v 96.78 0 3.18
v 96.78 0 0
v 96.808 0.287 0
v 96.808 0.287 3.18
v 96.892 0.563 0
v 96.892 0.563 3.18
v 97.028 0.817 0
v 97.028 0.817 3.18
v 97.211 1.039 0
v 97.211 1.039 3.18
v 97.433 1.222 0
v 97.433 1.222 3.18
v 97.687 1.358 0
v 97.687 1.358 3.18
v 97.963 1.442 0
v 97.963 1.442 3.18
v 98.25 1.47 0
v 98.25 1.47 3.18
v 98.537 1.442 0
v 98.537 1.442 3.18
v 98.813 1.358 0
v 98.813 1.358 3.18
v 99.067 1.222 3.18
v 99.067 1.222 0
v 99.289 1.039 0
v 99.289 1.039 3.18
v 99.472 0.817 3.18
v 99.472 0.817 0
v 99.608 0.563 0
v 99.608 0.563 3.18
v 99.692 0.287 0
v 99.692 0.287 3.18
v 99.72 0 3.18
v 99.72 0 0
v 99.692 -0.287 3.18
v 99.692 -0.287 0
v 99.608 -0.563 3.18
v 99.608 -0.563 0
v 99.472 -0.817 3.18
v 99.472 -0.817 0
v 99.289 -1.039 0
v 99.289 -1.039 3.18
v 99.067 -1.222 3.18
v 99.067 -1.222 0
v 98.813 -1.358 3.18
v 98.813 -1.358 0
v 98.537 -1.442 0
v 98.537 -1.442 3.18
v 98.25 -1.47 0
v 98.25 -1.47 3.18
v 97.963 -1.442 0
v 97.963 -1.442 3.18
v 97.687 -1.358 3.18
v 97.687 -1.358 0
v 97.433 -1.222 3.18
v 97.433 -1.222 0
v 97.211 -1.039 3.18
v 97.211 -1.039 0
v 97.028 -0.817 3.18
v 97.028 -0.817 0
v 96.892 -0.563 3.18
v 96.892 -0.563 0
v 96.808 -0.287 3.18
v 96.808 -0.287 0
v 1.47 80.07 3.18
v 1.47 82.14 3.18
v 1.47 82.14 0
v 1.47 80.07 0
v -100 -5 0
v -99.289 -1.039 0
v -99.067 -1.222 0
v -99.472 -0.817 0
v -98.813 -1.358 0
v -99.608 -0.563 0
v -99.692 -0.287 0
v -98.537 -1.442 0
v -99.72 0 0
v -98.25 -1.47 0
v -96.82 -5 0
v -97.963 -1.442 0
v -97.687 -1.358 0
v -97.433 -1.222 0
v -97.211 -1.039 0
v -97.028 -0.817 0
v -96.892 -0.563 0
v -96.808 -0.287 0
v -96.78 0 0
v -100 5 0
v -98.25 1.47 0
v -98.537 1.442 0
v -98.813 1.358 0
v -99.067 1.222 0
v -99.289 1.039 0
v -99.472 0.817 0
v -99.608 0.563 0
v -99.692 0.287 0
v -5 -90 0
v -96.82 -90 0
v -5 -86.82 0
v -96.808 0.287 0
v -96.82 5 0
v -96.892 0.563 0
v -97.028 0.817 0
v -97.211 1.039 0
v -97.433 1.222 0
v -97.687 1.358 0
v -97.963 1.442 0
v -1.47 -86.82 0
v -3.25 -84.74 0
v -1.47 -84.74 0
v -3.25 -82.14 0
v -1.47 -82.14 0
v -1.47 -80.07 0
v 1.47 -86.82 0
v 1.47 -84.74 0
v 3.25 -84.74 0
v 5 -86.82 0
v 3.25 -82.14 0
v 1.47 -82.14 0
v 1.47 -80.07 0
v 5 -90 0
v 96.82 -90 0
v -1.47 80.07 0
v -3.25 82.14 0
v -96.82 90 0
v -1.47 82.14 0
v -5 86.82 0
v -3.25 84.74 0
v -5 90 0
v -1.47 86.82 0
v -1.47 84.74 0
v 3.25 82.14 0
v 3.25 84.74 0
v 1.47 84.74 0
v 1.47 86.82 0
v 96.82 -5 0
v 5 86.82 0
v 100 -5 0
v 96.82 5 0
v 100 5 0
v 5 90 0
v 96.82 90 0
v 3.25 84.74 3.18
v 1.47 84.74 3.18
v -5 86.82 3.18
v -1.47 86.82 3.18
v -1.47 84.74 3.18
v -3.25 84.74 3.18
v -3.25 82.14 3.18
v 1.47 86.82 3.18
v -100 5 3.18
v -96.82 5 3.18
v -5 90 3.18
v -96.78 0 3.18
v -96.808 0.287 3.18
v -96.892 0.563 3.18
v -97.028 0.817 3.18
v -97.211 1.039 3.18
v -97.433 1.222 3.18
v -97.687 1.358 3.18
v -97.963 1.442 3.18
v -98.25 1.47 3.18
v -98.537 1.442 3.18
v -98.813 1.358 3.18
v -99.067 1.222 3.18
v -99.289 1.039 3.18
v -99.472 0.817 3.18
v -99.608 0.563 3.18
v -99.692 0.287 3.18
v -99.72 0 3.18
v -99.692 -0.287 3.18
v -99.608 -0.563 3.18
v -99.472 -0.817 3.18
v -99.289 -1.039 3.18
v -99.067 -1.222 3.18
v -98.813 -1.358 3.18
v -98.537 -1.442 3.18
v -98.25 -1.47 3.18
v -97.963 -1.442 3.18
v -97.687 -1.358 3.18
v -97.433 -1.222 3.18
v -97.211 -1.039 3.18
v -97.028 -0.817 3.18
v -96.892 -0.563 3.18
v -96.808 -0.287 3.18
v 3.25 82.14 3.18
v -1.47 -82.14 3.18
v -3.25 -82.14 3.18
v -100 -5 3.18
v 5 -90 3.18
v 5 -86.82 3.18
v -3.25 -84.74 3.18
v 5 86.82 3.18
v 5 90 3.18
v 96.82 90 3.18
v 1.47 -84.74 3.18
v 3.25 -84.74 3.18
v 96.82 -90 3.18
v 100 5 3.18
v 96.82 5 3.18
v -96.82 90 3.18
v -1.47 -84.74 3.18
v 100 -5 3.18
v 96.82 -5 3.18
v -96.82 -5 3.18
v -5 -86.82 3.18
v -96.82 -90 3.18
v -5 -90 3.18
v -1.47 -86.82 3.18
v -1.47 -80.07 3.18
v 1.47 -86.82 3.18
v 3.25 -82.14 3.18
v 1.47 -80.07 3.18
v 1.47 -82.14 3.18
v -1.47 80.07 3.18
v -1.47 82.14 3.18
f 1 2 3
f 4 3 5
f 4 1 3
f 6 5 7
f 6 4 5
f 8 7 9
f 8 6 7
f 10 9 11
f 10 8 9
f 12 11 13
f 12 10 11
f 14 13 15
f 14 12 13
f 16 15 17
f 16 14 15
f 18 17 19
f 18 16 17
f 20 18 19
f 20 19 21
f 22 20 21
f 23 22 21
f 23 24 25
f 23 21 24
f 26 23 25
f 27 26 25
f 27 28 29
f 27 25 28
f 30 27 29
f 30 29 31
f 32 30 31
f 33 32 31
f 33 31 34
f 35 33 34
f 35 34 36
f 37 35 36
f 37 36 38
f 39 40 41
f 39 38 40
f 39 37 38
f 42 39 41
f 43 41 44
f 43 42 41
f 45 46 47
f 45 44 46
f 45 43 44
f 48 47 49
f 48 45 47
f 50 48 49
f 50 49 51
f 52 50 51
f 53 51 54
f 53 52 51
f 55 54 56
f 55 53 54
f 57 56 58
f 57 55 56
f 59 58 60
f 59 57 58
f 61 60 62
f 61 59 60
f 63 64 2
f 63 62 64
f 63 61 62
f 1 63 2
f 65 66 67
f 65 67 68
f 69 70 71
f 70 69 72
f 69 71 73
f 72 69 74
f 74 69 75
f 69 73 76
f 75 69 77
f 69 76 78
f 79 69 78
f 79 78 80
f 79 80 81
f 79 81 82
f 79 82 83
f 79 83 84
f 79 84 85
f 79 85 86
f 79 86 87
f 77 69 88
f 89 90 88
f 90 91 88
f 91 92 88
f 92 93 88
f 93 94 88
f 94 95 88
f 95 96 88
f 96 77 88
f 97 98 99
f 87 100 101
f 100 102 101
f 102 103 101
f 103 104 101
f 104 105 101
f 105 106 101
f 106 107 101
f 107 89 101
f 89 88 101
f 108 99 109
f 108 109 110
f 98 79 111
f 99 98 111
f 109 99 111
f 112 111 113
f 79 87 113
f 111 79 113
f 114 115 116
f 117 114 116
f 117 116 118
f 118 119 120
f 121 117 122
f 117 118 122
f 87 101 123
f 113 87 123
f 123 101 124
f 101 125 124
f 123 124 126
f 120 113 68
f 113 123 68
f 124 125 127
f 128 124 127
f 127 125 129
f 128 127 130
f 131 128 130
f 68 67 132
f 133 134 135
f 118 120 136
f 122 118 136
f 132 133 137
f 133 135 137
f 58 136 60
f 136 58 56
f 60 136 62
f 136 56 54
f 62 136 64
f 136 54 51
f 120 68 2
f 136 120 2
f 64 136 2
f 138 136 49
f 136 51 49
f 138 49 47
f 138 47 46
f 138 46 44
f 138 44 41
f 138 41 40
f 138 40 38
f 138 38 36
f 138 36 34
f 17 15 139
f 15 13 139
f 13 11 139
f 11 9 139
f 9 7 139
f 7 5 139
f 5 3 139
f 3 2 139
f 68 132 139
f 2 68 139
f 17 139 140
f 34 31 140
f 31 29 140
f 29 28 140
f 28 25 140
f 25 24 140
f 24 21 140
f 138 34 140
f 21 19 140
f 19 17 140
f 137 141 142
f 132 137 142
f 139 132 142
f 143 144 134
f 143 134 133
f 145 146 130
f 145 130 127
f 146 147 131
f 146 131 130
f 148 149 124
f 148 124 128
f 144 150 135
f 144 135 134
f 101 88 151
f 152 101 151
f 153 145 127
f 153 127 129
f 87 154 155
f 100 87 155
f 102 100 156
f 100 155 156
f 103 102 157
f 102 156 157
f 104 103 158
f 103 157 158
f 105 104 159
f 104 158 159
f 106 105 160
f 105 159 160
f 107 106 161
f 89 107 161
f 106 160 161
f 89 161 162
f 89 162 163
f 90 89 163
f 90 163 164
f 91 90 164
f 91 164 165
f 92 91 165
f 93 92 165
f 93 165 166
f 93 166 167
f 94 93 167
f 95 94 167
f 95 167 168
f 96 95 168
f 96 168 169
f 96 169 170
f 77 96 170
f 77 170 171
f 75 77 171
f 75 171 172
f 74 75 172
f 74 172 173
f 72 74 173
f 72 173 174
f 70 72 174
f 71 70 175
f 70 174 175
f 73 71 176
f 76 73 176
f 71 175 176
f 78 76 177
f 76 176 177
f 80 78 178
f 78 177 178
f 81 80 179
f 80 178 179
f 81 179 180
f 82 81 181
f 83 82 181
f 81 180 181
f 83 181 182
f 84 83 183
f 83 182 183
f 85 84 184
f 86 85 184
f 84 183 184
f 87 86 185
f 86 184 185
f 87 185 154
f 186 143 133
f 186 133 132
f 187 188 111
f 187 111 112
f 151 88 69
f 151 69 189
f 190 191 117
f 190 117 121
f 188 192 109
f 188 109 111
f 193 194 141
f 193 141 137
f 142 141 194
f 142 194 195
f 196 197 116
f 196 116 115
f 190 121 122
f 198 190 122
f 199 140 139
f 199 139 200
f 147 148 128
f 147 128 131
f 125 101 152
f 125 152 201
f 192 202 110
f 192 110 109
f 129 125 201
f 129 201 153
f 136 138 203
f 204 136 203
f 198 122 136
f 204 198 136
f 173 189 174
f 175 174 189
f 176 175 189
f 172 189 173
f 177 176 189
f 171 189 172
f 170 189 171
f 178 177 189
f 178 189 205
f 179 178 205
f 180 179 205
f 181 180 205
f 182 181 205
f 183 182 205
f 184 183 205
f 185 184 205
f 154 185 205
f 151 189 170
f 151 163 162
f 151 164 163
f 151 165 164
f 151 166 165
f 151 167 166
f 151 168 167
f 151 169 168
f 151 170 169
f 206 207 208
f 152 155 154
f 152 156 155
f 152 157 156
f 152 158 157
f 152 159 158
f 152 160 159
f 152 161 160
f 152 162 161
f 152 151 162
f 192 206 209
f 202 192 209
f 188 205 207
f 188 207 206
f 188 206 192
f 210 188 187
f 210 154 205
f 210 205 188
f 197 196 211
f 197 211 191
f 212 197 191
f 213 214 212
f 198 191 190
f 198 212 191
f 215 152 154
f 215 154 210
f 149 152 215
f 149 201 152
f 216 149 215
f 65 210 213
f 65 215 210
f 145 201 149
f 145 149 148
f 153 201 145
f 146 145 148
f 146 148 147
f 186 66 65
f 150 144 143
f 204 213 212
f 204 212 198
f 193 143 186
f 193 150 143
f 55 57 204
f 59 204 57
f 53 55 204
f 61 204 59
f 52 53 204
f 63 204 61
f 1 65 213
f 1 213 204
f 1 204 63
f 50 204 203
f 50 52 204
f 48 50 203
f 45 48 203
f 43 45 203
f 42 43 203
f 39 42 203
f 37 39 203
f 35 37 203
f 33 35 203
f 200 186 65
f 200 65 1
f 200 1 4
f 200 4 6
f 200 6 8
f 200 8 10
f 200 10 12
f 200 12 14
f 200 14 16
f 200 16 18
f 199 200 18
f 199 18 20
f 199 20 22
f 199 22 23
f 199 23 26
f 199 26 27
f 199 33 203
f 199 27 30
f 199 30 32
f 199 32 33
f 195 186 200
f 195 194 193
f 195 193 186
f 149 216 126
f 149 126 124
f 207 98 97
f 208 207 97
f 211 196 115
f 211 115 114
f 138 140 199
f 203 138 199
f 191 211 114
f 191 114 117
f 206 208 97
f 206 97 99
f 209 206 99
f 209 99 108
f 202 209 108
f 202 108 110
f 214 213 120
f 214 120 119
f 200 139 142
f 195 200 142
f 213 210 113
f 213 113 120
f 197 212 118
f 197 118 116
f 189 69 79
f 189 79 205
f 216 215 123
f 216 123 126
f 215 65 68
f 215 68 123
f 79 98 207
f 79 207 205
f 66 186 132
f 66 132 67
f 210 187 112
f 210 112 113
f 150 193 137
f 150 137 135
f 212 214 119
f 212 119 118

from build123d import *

# Parameters (mm, degrees)
SKETCH2_W           = 193.64
SKETCH2_H           = 180
BOSS_EXTRUDE1_DEPTH = 3.18
CUT_EXTRUDE1_DEPTH  = 133.227927459
SKETCH4_W           = 3.18
SKETCH4_H           = 10
BOSS_EXTRUDE2_DEPTH = 3.18
SKETCH6_R           = 1.47
CUT_EXTRUDE2_DEPTH  = 135.573817662


with BuildPart() as part:
    # Sketch2 → Boss-Extrude1 (new body)
    with BuildSketch(Plane.XY):
        Rectangle(SKETCH2_W, SKETCH2_H)
    extrude(amount=BOSS_EXTRUDE1_DEPTH)

    # Sketch3 → Cut-Extrude1 (cut, through all)
    with BuildSketch(Plane.XY.offset(3.18)):
        Polygon((-5, 90), (5, 90), (5, 86.82), (1.47, 86.82), (1.47, 84.74), (3.25, 84.74), (3.25, 82.14), (1.47, 82.14), (1.47, 80.07), (-1.47, 80.07), (-1.47, 82.14), (-3.25, 82.14), (-3.25, 84.74), (-1.47, 84.74), (-1.47, 86.82), (-5, 86.82), align=None)
        Polygon((1.47, -86.82), (5, -86.82), (5, -90), (-5, -90), (-5, -86.82), (-1.47, -86.82), (-1.47, -84.74), (-3.25, -84.74), (-3.25, -82.14), (-1.47, -82.14), (-1.47, -80.07), (1.47, -80.07), (1.47, -82.14), (3.25, -82.14), (3.25, -84.74), (1.47, -84.74), align=None)
    extrude(amount=-CUT_EXTRUDE1_DEPTH, mode=Mode.SUBTRACT)

    # Sketch4 → Boss-Extrude2 (add)
    with BuildSketch(Plane.ZY.offset(96.82)):
        with Locations((1.59, 0)):
            Rectangle(SKETCH4_W, SKETCH4_H)
    boss_extrude2 = extrude(amount=BOSS_EXTRUDE2_DEPTH)

    # Sketch6 → Cut-Extrude2 (cut, through all)
    with BuildSketch(Plane.XY.offset(3.18)):
        with Locations((-98.25, 0)):
            Circle(SKETCH6_R)
    cut_extrude2 = extrude(amount=-CUT_EXTRUDE2_DEPTH, mode=Mode.SUBTRACT)

    # Mirror1: Boss-Extrude2 across plane
    add(boss_extrude2.mirror(Plane(origin=(0, 0, 0), x_dir=(0, 0, 1), z_dir=(1, 0, 0))))

    # Mirror2: Cut-Extrude2 across plane
    add(cut_extrude2.mirror(Plane(origin=(0, 0, 0), x_dir=(0, 0, 1), z_dir=(1, 0, 0))), mode=Mode.SUBTRACT)


solid = part.part
